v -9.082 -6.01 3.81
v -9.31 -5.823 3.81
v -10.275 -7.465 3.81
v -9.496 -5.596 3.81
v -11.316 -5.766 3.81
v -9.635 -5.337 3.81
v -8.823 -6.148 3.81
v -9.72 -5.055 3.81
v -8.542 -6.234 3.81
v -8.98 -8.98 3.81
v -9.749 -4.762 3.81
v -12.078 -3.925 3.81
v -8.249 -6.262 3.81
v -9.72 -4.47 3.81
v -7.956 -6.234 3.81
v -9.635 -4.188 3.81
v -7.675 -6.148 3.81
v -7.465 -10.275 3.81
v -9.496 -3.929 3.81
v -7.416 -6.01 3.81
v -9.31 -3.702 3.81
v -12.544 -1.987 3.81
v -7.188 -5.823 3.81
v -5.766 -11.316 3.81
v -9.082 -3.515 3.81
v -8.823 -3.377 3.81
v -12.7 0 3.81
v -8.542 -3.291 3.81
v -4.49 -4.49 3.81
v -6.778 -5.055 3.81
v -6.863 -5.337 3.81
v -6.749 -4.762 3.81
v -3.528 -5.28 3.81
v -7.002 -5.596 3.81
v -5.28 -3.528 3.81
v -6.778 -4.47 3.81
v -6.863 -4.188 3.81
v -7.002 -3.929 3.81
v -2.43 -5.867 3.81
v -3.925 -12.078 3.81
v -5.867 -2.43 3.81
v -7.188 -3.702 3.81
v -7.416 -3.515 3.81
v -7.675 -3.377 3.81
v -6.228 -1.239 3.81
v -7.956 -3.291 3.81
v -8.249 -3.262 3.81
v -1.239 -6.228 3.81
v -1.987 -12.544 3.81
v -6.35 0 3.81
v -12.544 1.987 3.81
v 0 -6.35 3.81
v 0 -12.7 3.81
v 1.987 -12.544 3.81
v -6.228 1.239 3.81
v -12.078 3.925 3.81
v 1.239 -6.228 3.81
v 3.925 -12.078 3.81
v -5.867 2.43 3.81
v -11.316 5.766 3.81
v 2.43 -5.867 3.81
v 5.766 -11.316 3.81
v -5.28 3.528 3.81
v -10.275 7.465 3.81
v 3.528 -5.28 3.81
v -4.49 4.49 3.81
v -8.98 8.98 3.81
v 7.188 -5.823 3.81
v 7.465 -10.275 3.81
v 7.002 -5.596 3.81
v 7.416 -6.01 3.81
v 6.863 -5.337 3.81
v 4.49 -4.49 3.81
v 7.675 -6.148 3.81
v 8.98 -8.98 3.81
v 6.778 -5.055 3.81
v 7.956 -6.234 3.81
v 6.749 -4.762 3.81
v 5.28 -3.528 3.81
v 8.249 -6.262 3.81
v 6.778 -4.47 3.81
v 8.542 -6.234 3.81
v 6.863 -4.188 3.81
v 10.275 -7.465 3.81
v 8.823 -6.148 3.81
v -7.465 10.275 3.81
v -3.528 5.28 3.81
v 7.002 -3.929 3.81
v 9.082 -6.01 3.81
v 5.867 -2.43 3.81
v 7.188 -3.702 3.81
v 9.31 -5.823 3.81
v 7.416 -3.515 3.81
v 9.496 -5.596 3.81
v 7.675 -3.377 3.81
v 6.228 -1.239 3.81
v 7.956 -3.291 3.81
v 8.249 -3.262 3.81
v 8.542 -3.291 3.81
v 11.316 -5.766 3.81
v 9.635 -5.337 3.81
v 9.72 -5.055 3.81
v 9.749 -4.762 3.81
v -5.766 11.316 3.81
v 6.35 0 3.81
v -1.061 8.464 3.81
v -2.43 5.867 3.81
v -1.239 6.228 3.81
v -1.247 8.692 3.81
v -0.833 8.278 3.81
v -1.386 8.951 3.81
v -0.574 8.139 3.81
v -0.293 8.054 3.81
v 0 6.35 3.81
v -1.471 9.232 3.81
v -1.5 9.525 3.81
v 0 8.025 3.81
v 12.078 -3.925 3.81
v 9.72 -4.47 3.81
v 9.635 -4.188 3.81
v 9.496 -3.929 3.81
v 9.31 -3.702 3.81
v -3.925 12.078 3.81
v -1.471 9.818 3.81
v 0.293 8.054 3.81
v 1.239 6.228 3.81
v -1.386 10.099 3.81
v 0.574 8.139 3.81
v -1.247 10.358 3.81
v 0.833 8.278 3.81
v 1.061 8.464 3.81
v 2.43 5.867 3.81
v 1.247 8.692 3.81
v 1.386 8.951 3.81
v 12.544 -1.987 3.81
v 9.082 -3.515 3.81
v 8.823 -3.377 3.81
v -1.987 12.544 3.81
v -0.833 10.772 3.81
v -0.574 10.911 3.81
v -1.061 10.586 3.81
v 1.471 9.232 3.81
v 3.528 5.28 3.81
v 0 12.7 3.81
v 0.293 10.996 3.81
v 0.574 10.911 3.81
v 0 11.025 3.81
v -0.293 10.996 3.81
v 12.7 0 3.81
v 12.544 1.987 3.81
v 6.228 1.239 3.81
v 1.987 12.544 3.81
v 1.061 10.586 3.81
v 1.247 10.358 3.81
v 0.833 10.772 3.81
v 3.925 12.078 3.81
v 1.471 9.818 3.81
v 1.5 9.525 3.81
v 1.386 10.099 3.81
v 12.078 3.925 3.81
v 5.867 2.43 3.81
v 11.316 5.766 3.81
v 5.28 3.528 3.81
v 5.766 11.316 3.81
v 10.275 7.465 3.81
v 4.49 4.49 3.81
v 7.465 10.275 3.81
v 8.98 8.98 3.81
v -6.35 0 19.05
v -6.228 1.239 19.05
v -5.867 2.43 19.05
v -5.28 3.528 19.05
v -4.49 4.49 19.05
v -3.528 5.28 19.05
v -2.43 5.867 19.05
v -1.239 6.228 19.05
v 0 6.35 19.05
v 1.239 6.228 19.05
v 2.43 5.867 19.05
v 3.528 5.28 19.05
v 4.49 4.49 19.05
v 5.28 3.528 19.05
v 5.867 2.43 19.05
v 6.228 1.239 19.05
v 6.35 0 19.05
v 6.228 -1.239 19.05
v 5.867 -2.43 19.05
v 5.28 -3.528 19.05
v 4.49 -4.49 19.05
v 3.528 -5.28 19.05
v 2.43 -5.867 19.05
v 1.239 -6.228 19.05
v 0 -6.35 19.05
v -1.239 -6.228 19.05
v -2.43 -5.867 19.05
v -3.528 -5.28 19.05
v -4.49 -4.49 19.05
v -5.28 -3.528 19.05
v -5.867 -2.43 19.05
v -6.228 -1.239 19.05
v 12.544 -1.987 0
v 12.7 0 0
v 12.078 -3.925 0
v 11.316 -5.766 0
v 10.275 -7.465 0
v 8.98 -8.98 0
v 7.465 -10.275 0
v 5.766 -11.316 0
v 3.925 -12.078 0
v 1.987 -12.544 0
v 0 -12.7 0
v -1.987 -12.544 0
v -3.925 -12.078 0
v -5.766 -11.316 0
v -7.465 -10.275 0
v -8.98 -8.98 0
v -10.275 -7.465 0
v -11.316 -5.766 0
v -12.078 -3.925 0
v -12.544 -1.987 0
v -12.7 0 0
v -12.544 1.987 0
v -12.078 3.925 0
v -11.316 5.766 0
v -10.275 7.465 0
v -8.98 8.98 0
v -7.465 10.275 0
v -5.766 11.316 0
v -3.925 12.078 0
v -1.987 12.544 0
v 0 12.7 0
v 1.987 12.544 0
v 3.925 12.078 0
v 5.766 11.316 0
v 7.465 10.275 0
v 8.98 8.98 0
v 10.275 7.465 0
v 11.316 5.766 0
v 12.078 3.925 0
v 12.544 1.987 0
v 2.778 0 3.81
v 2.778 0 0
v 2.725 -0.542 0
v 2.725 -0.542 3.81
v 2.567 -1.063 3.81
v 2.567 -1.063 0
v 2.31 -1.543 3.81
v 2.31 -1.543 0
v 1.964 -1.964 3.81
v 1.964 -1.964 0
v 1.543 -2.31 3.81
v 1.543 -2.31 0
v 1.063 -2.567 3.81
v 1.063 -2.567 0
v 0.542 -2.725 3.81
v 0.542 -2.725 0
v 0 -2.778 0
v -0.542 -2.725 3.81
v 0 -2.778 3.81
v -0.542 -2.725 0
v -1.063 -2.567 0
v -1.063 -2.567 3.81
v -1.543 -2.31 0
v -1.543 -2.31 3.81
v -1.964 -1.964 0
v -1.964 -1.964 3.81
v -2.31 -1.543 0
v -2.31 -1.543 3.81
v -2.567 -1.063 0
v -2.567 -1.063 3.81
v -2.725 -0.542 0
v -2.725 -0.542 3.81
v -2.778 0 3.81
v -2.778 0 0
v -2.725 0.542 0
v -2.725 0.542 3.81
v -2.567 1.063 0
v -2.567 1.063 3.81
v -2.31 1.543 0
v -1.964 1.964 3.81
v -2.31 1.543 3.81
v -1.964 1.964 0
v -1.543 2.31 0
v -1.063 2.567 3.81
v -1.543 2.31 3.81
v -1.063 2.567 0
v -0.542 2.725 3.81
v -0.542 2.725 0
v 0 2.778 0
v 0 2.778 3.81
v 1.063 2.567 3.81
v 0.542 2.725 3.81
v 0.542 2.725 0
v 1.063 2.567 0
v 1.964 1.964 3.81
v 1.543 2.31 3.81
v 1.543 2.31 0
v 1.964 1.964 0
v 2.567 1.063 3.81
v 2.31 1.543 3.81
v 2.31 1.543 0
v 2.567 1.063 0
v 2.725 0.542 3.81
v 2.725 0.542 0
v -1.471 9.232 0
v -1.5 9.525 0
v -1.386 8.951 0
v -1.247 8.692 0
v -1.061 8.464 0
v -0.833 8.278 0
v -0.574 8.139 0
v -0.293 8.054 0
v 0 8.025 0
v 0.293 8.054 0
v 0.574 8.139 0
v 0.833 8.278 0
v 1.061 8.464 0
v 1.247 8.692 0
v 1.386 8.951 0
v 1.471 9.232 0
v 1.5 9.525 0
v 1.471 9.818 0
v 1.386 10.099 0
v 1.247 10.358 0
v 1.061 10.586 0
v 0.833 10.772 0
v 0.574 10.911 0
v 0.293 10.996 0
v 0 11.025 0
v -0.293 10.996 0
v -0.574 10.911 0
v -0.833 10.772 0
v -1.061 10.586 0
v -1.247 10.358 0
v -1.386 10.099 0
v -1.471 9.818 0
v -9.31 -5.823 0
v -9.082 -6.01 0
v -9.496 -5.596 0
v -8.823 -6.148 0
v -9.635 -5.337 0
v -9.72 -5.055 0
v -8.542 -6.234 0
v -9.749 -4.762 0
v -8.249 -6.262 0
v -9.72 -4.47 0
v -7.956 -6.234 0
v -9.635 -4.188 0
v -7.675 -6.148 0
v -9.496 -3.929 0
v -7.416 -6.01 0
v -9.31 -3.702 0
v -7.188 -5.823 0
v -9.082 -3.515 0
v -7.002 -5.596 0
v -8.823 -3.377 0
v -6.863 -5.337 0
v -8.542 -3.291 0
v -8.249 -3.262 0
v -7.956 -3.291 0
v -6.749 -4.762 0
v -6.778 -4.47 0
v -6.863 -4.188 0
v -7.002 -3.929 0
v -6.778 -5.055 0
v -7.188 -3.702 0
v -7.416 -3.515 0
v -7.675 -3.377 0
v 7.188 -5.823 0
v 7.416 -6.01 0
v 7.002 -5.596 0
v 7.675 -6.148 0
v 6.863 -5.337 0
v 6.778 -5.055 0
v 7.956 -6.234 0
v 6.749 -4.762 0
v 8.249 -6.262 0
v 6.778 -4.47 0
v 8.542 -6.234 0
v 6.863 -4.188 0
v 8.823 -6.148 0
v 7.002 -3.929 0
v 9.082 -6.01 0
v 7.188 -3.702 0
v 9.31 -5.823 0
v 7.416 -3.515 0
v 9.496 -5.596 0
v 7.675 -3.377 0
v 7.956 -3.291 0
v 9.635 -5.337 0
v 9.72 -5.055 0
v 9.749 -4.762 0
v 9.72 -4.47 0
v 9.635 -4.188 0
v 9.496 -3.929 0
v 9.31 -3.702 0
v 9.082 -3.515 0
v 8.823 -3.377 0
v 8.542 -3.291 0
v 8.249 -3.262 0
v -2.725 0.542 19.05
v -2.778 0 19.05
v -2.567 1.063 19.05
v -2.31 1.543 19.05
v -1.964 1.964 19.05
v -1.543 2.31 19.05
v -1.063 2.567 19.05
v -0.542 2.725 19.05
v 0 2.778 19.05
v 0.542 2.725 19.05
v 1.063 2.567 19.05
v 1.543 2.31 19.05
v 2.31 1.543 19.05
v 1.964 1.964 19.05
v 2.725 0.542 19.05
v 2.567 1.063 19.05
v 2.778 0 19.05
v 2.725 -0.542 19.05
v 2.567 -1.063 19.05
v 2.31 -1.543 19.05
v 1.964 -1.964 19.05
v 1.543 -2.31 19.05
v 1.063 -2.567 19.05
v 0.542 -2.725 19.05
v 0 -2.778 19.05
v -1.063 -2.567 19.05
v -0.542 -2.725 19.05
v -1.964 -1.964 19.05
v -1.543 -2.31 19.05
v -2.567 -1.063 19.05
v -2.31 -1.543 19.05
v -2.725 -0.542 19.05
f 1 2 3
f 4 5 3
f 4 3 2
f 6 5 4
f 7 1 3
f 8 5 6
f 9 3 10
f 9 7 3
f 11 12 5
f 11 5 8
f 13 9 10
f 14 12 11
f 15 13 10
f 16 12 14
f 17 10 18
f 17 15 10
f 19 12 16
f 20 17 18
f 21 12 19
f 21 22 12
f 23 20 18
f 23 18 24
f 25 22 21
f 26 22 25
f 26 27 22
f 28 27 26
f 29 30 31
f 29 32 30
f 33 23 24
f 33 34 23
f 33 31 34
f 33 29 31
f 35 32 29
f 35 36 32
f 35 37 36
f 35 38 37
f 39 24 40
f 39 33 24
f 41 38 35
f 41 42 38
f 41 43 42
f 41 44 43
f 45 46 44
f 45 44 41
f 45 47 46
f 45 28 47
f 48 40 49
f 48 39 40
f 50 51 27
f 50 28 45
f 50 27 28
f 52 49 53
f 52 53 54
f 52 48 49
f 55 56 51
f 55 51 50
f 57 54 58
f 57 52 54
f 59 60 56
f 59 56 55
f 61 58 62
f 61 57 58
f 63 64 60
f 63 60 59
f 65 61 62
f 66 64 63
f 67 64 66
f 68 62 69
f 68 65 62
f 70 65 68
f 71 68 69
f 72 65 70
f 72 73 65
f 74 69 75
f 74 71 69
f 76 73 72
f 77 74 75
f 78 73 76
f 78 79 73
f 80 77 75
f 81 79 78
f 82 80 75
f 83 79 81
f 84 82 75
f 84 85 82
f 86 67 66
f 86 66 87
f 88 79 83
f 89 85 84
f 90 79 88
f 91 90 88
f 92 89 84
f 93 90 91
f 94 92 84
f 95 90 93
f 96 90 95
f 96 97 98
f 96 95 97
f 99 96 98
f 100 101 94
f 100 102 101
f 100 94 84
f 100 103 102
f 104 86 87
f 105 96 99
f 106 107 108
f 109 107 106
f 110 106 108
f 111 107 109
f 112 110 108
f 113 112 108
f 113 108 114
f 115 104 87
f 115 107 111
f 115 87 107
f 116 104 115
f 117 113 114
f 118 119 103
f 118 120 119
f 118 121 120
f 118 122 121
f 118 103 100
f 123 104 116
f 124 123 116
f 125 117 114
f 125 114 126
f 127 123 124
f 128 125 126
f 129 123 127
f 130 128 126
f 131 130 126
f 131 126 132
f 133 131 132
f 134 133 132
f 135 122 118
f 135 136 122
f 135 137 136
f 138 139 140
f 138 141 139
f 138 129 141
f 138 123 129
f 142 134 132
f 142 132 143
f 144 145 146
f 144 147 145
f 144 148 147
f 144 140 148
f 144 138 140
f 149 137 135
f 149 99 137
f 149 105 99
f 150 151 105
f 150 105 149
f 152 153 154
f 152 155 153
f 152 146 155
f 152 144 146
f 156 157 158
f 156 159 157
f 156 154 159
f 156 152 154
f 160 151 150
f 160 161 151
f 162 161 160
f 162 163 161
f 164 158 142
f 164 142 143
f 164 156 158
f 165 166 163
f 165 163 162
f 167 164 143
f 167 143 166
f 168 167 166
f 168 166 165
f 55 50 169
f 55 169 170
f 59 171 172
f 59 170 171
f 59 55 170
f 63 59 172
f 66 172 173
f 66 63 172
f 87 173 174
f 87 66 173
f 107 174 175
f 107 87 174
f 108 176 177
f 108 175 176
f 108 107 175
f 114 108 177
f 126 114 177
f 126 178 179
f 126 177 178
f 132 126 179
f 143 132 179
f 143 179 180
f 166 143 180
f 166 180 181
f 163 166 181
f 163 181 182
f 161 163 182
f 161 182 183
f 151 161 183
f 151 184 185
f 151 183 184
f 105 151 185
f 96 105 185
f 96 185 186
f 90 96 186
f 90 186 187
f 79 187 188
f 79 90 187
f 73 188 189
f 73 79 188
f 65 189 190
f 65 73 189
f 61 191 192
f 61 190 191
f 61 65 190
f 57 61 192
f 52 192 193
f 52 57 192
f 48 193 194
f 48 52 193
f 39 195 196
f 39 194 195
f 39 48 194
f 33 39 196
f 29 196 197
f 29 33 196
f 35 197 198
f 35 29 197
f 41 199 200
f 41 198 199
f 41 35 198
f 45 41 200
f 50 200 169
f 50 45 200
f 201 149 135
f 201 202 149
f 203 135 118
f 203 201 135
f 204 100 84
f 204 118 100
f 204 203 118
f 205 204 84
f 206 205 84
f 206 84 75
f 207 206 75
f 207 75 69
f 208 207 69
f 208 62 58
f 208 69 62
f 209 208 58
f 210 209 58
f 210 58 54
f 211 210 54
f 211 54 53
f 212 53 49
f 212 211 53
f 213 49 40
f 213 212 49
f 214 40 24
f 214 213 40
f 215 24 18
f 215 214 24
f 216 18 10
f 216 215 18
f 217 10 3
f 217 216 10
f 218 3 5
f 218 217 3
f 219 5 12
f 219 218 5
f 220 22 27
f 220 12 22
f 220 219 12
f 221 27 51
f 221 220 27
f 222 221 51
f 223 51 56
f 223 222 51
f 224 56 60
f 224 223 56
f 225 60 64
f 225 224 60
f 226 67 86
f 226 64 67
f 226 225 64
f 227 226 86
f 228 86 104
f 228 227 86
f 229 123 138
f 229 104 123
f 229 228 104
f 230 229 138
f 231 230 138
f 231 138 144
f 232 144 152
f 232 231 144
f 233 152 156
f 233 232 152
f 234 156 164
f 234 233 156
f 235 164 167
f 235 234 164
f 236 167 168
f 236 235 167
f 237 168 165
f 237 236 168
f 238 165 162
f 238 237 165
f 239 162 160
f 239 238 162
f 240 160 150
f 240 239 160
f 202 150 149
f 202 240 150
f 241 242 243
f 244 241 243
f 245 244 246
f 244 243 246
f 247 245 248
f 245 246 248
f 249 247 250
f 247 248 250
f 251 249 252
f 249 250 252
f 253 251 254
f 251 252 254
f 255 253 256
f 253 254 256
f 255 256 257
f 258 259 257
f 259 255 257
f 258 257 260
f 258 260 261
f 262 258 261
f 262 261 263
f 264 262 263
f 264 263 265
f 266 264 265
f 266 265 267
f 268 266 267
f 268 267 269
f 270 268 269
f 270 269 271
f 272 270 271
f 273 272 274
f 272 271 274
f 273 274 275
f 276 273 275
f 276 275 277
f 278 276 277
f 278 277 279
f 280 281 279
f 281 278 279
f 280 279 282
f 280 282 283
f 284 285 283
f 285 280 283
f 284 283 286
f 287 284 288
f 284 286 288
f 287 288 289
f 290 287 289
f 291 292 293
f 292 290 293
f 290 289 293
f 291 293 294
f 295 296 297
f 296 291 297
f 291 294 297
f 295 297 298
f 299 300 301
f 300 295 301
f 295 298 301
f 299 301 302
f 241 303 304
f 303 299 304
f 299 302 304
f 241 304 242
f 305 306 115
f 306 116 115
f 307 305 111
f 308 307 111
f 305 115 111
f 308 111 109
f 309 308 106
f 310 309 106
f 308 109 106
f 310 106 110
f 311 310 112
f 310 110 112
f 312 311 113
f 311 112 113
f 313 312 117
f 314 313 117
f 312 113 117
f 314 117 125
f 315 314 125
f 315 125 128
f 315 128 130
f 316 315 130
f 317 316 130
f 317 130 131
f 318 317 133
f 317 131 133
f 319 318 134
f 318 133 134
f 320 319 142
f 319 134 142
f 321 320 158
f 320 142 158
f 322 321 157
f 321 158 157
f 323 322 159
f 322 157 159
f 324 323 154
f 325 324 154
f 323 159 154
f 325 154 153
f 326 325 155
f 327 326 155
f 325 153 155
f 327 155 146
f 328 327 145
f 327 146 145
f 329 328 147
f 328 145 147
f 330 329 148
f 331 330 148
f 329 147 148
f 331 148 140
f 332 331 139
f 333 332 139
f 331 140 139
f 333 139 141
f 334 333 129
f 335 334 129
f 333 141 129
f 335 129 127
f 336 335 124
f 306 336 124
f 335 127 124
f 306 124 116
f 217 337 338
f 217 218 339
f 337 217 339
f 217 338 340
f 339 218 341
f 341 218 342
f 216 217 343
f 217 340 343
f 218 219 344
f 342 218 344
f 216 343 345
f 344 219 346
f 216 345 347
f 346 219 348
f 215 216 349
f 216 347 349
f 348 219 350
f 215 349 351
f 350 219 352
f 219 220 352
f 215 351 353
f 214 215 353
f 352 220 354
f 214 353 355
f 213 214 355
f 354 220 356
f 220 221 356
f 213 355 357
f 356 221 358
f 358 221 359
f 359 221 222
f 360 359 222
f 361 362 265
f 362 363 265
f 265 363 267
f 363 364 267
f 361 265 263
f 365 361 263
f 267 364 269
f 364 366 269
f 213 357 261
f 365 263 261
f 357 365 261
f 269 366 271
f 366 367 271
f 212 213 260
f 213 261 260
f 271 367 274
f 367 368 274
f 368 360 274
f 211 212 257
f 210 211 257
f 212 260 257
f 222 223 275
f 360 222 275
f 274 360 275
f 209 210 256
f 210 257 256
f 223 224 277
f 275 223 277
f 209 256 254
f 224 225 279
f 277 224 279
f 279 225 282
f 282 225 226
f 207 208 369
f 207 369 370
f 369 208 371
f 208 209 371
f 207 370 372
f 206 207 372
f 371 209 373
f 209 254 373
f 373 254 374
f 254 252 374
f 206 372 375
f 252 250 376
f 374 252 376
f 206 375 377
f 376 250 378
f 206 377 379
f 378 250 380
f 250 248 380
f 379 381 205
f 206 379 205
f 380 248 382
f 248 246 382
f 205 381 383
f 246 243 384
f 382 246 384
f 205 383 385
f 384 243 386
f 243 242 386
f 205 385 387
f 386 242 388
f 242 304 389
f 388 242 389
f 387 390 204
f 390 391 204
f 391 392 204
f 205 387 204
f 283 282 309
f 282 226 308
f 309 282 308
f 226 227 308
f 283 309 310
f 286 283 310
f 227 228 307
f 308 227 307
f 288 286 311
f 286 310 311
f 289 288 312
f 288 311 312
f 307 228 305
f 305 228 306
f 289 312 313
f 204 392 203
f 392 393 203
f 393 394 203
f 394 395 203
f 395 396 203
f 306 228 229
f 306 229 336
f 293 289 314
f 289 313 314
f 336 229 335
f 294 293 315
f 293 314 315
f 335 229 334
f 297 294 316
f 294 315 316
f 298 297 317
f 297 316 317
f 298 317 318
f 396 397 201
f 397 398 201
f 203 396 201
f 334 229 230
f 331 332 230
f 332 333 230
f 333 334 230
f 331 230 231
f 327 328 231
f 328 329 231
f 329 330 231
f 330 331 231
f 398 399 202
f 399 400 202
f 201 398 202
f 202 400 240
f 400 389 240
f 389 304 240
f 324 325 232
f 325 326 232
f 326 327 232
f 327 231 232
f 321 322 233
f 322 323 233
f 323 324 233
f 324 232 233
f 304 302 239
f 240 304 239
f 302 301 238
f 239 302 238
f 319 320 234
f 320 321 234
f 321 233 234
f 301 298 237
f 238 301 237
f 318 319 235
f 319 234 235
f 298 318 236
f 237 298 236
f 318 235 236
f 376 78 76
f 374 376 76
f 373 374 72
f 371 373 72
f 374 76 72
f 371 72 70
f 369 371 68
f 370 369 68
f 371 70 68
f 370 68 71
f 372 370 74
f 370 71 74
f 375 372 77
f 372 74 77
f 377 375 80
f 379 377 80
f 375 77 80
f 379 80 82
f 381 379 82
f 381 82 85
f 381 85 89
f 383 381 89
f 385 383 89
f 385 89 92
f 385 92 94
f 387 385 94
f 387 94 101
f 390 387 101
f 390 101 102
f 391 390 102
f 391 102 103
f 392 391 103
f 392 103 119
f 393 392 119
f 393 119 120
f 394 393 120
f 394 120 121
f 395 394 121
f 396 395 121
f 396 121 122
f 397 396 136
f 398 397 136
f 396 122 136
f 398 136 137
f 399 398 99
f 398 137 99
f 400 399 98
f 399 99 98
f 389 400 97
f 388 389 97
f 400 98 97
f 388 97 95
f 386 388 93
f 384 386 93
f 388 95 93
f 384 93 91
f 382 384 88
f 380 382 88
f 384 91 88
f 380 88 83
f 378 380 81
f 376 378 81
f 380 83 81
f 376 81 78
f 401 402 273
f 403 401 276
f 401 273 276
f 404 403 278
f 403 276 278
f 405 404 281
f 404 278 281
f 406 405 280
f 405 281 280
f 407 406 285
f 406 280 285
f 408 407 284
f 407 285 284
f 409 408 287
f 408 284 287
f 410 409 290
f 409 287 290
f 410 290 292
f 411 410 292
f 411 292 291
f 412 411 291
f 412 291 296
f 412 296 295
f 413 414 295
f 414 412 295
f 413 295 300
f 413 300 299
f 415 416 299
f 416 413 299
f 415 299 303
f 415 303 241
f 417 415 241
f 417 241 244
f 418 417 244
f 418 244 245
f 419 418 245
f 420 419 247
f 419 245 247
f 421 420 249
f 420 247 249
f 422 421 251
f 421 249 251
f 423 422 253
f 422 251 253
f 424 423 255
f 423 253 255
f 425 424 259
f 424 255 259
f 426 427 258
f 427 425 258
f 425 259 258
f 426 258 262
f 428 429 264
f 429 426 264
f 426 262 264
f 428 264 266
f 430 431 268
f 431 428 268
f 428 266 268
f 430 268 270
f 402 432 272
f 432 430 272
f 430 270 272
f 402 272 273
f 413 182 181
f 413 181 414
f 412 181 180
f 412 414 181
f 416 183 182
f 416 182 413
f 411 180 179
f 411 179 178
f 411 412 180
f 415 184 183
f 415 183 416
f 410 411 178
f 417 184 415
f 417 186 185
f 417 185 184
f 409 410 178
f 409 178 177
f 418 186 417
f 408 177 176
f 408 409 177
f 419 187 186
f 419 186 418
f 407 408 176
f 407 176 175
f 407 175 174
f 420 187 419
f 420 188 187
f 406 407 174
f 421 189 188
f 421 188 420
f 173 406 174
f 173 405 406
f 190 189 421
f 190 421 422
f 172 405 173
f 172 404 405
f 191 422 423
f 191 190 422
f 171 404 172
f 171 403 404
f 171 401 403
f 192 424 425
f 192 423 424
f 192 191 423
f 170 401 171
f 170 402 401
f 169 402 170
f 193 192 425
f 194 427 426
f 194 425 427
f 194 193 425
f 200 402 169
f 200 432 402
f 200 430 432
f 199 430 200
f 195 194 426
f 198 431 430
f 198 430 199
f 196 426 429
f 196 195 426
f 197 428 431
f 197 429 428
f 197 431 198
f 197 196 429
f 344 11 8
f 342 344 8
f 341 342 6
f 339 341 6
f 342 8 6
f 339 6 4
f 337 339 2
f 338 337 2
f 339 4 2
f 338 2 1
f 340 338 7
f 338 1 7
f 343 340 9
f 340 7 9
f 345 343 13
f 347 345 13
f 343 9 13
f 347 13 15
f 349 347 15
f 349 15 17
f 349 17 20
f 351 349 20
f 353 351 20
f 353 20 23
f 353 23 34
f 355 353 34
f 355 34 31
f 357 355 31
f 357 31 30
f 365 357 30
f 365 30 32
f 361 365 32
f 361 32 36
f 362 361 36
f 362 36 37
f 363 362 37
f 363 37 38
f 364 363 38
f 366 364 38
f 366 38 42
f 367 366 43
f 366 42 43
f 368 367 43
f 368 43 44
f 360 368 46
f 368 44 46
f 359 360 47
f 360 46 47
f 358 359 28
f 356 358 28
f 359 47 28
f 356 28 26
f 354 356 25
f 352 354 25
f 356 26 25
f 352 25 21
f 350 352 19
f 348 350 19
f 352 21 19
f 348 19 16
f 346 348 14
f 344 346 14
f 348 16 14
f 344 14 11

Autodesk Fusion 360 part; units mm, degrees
sketch "Sketch1" plane through (0, 0, 0) normal (0, 0, 1) x (1, 0, 0)
  circle A0 centre (0, 0) radius 12.7
  circle A1 centre (0, 0) radius 2.7781
  dimension "d1" = 25.4
  dimension "d2" = 5.5563
extrude "Extrude1" add sketch "Sketch1" along normal blind 3.81
sketch "Sketch2" plane through (0, 0, 3.81) normal (0, 0, 1) x (-1, 0, 0)
  circle A0 centre (0, 0) radius 2.7781
  circle A1 centre (0, 0) radius 12.7
  circle A2 centre (0, 0) radius 2.7781
  circle A3 centre (0, 0) radius 6.35
  line L0 (0, 0) -> (0, -12.7) construction
  line L1 (0, 0) -> (0, 12.7) construction
  line L2 (0, 0) -> (-12.7, 0) construction
  line L3 (0, 0) -> (12.7, 0) construction
  circle A4 centre (0, 0) radius 9.525 construction
  circle A5 centre (0, -9.525) radius 1.5
  arc A6 (-8.2489, 4.7625) -> (0, -9.525) centre (0, 0) ccw construction
  line L4 (0, 0) -> (-8.2489, 4.7625) construction
  line L5 (0, 0) -> (0, -9.525) construction
  arc A7 (0, -9.525) -> (8.2489, 4.7625) centre (0, 0) ccw construction
  line L6 (0, 0) -> (0, -9.525) construction
  line L7 (0, 0) -> (8.2489, 4.7625) construction
  circle A8 centre (-8.2489, 4.7625) radius 1.5
  circle A9 centre (8.2489, 4.7625) radius 1.5
  dimension "d5" = 5.5563
  dimension "d6" = 12.7
  dimension "d9" = 19.05
  dimension "d10" = 3
  dimension "d11" = 120
  dimension "d12" = 120
  dimension "d13" = 3
  dimension "d14" = 3
extrude "Extrude3" cut sketch "Sketch2" against normal blind 3.81 contours A5 | A8 | A9
extrude "Extrude2" add sketch "Sketch2" along normal blind 15.24 contours A3
equation "d7 = 19.05 mm - 3.81 mm"
